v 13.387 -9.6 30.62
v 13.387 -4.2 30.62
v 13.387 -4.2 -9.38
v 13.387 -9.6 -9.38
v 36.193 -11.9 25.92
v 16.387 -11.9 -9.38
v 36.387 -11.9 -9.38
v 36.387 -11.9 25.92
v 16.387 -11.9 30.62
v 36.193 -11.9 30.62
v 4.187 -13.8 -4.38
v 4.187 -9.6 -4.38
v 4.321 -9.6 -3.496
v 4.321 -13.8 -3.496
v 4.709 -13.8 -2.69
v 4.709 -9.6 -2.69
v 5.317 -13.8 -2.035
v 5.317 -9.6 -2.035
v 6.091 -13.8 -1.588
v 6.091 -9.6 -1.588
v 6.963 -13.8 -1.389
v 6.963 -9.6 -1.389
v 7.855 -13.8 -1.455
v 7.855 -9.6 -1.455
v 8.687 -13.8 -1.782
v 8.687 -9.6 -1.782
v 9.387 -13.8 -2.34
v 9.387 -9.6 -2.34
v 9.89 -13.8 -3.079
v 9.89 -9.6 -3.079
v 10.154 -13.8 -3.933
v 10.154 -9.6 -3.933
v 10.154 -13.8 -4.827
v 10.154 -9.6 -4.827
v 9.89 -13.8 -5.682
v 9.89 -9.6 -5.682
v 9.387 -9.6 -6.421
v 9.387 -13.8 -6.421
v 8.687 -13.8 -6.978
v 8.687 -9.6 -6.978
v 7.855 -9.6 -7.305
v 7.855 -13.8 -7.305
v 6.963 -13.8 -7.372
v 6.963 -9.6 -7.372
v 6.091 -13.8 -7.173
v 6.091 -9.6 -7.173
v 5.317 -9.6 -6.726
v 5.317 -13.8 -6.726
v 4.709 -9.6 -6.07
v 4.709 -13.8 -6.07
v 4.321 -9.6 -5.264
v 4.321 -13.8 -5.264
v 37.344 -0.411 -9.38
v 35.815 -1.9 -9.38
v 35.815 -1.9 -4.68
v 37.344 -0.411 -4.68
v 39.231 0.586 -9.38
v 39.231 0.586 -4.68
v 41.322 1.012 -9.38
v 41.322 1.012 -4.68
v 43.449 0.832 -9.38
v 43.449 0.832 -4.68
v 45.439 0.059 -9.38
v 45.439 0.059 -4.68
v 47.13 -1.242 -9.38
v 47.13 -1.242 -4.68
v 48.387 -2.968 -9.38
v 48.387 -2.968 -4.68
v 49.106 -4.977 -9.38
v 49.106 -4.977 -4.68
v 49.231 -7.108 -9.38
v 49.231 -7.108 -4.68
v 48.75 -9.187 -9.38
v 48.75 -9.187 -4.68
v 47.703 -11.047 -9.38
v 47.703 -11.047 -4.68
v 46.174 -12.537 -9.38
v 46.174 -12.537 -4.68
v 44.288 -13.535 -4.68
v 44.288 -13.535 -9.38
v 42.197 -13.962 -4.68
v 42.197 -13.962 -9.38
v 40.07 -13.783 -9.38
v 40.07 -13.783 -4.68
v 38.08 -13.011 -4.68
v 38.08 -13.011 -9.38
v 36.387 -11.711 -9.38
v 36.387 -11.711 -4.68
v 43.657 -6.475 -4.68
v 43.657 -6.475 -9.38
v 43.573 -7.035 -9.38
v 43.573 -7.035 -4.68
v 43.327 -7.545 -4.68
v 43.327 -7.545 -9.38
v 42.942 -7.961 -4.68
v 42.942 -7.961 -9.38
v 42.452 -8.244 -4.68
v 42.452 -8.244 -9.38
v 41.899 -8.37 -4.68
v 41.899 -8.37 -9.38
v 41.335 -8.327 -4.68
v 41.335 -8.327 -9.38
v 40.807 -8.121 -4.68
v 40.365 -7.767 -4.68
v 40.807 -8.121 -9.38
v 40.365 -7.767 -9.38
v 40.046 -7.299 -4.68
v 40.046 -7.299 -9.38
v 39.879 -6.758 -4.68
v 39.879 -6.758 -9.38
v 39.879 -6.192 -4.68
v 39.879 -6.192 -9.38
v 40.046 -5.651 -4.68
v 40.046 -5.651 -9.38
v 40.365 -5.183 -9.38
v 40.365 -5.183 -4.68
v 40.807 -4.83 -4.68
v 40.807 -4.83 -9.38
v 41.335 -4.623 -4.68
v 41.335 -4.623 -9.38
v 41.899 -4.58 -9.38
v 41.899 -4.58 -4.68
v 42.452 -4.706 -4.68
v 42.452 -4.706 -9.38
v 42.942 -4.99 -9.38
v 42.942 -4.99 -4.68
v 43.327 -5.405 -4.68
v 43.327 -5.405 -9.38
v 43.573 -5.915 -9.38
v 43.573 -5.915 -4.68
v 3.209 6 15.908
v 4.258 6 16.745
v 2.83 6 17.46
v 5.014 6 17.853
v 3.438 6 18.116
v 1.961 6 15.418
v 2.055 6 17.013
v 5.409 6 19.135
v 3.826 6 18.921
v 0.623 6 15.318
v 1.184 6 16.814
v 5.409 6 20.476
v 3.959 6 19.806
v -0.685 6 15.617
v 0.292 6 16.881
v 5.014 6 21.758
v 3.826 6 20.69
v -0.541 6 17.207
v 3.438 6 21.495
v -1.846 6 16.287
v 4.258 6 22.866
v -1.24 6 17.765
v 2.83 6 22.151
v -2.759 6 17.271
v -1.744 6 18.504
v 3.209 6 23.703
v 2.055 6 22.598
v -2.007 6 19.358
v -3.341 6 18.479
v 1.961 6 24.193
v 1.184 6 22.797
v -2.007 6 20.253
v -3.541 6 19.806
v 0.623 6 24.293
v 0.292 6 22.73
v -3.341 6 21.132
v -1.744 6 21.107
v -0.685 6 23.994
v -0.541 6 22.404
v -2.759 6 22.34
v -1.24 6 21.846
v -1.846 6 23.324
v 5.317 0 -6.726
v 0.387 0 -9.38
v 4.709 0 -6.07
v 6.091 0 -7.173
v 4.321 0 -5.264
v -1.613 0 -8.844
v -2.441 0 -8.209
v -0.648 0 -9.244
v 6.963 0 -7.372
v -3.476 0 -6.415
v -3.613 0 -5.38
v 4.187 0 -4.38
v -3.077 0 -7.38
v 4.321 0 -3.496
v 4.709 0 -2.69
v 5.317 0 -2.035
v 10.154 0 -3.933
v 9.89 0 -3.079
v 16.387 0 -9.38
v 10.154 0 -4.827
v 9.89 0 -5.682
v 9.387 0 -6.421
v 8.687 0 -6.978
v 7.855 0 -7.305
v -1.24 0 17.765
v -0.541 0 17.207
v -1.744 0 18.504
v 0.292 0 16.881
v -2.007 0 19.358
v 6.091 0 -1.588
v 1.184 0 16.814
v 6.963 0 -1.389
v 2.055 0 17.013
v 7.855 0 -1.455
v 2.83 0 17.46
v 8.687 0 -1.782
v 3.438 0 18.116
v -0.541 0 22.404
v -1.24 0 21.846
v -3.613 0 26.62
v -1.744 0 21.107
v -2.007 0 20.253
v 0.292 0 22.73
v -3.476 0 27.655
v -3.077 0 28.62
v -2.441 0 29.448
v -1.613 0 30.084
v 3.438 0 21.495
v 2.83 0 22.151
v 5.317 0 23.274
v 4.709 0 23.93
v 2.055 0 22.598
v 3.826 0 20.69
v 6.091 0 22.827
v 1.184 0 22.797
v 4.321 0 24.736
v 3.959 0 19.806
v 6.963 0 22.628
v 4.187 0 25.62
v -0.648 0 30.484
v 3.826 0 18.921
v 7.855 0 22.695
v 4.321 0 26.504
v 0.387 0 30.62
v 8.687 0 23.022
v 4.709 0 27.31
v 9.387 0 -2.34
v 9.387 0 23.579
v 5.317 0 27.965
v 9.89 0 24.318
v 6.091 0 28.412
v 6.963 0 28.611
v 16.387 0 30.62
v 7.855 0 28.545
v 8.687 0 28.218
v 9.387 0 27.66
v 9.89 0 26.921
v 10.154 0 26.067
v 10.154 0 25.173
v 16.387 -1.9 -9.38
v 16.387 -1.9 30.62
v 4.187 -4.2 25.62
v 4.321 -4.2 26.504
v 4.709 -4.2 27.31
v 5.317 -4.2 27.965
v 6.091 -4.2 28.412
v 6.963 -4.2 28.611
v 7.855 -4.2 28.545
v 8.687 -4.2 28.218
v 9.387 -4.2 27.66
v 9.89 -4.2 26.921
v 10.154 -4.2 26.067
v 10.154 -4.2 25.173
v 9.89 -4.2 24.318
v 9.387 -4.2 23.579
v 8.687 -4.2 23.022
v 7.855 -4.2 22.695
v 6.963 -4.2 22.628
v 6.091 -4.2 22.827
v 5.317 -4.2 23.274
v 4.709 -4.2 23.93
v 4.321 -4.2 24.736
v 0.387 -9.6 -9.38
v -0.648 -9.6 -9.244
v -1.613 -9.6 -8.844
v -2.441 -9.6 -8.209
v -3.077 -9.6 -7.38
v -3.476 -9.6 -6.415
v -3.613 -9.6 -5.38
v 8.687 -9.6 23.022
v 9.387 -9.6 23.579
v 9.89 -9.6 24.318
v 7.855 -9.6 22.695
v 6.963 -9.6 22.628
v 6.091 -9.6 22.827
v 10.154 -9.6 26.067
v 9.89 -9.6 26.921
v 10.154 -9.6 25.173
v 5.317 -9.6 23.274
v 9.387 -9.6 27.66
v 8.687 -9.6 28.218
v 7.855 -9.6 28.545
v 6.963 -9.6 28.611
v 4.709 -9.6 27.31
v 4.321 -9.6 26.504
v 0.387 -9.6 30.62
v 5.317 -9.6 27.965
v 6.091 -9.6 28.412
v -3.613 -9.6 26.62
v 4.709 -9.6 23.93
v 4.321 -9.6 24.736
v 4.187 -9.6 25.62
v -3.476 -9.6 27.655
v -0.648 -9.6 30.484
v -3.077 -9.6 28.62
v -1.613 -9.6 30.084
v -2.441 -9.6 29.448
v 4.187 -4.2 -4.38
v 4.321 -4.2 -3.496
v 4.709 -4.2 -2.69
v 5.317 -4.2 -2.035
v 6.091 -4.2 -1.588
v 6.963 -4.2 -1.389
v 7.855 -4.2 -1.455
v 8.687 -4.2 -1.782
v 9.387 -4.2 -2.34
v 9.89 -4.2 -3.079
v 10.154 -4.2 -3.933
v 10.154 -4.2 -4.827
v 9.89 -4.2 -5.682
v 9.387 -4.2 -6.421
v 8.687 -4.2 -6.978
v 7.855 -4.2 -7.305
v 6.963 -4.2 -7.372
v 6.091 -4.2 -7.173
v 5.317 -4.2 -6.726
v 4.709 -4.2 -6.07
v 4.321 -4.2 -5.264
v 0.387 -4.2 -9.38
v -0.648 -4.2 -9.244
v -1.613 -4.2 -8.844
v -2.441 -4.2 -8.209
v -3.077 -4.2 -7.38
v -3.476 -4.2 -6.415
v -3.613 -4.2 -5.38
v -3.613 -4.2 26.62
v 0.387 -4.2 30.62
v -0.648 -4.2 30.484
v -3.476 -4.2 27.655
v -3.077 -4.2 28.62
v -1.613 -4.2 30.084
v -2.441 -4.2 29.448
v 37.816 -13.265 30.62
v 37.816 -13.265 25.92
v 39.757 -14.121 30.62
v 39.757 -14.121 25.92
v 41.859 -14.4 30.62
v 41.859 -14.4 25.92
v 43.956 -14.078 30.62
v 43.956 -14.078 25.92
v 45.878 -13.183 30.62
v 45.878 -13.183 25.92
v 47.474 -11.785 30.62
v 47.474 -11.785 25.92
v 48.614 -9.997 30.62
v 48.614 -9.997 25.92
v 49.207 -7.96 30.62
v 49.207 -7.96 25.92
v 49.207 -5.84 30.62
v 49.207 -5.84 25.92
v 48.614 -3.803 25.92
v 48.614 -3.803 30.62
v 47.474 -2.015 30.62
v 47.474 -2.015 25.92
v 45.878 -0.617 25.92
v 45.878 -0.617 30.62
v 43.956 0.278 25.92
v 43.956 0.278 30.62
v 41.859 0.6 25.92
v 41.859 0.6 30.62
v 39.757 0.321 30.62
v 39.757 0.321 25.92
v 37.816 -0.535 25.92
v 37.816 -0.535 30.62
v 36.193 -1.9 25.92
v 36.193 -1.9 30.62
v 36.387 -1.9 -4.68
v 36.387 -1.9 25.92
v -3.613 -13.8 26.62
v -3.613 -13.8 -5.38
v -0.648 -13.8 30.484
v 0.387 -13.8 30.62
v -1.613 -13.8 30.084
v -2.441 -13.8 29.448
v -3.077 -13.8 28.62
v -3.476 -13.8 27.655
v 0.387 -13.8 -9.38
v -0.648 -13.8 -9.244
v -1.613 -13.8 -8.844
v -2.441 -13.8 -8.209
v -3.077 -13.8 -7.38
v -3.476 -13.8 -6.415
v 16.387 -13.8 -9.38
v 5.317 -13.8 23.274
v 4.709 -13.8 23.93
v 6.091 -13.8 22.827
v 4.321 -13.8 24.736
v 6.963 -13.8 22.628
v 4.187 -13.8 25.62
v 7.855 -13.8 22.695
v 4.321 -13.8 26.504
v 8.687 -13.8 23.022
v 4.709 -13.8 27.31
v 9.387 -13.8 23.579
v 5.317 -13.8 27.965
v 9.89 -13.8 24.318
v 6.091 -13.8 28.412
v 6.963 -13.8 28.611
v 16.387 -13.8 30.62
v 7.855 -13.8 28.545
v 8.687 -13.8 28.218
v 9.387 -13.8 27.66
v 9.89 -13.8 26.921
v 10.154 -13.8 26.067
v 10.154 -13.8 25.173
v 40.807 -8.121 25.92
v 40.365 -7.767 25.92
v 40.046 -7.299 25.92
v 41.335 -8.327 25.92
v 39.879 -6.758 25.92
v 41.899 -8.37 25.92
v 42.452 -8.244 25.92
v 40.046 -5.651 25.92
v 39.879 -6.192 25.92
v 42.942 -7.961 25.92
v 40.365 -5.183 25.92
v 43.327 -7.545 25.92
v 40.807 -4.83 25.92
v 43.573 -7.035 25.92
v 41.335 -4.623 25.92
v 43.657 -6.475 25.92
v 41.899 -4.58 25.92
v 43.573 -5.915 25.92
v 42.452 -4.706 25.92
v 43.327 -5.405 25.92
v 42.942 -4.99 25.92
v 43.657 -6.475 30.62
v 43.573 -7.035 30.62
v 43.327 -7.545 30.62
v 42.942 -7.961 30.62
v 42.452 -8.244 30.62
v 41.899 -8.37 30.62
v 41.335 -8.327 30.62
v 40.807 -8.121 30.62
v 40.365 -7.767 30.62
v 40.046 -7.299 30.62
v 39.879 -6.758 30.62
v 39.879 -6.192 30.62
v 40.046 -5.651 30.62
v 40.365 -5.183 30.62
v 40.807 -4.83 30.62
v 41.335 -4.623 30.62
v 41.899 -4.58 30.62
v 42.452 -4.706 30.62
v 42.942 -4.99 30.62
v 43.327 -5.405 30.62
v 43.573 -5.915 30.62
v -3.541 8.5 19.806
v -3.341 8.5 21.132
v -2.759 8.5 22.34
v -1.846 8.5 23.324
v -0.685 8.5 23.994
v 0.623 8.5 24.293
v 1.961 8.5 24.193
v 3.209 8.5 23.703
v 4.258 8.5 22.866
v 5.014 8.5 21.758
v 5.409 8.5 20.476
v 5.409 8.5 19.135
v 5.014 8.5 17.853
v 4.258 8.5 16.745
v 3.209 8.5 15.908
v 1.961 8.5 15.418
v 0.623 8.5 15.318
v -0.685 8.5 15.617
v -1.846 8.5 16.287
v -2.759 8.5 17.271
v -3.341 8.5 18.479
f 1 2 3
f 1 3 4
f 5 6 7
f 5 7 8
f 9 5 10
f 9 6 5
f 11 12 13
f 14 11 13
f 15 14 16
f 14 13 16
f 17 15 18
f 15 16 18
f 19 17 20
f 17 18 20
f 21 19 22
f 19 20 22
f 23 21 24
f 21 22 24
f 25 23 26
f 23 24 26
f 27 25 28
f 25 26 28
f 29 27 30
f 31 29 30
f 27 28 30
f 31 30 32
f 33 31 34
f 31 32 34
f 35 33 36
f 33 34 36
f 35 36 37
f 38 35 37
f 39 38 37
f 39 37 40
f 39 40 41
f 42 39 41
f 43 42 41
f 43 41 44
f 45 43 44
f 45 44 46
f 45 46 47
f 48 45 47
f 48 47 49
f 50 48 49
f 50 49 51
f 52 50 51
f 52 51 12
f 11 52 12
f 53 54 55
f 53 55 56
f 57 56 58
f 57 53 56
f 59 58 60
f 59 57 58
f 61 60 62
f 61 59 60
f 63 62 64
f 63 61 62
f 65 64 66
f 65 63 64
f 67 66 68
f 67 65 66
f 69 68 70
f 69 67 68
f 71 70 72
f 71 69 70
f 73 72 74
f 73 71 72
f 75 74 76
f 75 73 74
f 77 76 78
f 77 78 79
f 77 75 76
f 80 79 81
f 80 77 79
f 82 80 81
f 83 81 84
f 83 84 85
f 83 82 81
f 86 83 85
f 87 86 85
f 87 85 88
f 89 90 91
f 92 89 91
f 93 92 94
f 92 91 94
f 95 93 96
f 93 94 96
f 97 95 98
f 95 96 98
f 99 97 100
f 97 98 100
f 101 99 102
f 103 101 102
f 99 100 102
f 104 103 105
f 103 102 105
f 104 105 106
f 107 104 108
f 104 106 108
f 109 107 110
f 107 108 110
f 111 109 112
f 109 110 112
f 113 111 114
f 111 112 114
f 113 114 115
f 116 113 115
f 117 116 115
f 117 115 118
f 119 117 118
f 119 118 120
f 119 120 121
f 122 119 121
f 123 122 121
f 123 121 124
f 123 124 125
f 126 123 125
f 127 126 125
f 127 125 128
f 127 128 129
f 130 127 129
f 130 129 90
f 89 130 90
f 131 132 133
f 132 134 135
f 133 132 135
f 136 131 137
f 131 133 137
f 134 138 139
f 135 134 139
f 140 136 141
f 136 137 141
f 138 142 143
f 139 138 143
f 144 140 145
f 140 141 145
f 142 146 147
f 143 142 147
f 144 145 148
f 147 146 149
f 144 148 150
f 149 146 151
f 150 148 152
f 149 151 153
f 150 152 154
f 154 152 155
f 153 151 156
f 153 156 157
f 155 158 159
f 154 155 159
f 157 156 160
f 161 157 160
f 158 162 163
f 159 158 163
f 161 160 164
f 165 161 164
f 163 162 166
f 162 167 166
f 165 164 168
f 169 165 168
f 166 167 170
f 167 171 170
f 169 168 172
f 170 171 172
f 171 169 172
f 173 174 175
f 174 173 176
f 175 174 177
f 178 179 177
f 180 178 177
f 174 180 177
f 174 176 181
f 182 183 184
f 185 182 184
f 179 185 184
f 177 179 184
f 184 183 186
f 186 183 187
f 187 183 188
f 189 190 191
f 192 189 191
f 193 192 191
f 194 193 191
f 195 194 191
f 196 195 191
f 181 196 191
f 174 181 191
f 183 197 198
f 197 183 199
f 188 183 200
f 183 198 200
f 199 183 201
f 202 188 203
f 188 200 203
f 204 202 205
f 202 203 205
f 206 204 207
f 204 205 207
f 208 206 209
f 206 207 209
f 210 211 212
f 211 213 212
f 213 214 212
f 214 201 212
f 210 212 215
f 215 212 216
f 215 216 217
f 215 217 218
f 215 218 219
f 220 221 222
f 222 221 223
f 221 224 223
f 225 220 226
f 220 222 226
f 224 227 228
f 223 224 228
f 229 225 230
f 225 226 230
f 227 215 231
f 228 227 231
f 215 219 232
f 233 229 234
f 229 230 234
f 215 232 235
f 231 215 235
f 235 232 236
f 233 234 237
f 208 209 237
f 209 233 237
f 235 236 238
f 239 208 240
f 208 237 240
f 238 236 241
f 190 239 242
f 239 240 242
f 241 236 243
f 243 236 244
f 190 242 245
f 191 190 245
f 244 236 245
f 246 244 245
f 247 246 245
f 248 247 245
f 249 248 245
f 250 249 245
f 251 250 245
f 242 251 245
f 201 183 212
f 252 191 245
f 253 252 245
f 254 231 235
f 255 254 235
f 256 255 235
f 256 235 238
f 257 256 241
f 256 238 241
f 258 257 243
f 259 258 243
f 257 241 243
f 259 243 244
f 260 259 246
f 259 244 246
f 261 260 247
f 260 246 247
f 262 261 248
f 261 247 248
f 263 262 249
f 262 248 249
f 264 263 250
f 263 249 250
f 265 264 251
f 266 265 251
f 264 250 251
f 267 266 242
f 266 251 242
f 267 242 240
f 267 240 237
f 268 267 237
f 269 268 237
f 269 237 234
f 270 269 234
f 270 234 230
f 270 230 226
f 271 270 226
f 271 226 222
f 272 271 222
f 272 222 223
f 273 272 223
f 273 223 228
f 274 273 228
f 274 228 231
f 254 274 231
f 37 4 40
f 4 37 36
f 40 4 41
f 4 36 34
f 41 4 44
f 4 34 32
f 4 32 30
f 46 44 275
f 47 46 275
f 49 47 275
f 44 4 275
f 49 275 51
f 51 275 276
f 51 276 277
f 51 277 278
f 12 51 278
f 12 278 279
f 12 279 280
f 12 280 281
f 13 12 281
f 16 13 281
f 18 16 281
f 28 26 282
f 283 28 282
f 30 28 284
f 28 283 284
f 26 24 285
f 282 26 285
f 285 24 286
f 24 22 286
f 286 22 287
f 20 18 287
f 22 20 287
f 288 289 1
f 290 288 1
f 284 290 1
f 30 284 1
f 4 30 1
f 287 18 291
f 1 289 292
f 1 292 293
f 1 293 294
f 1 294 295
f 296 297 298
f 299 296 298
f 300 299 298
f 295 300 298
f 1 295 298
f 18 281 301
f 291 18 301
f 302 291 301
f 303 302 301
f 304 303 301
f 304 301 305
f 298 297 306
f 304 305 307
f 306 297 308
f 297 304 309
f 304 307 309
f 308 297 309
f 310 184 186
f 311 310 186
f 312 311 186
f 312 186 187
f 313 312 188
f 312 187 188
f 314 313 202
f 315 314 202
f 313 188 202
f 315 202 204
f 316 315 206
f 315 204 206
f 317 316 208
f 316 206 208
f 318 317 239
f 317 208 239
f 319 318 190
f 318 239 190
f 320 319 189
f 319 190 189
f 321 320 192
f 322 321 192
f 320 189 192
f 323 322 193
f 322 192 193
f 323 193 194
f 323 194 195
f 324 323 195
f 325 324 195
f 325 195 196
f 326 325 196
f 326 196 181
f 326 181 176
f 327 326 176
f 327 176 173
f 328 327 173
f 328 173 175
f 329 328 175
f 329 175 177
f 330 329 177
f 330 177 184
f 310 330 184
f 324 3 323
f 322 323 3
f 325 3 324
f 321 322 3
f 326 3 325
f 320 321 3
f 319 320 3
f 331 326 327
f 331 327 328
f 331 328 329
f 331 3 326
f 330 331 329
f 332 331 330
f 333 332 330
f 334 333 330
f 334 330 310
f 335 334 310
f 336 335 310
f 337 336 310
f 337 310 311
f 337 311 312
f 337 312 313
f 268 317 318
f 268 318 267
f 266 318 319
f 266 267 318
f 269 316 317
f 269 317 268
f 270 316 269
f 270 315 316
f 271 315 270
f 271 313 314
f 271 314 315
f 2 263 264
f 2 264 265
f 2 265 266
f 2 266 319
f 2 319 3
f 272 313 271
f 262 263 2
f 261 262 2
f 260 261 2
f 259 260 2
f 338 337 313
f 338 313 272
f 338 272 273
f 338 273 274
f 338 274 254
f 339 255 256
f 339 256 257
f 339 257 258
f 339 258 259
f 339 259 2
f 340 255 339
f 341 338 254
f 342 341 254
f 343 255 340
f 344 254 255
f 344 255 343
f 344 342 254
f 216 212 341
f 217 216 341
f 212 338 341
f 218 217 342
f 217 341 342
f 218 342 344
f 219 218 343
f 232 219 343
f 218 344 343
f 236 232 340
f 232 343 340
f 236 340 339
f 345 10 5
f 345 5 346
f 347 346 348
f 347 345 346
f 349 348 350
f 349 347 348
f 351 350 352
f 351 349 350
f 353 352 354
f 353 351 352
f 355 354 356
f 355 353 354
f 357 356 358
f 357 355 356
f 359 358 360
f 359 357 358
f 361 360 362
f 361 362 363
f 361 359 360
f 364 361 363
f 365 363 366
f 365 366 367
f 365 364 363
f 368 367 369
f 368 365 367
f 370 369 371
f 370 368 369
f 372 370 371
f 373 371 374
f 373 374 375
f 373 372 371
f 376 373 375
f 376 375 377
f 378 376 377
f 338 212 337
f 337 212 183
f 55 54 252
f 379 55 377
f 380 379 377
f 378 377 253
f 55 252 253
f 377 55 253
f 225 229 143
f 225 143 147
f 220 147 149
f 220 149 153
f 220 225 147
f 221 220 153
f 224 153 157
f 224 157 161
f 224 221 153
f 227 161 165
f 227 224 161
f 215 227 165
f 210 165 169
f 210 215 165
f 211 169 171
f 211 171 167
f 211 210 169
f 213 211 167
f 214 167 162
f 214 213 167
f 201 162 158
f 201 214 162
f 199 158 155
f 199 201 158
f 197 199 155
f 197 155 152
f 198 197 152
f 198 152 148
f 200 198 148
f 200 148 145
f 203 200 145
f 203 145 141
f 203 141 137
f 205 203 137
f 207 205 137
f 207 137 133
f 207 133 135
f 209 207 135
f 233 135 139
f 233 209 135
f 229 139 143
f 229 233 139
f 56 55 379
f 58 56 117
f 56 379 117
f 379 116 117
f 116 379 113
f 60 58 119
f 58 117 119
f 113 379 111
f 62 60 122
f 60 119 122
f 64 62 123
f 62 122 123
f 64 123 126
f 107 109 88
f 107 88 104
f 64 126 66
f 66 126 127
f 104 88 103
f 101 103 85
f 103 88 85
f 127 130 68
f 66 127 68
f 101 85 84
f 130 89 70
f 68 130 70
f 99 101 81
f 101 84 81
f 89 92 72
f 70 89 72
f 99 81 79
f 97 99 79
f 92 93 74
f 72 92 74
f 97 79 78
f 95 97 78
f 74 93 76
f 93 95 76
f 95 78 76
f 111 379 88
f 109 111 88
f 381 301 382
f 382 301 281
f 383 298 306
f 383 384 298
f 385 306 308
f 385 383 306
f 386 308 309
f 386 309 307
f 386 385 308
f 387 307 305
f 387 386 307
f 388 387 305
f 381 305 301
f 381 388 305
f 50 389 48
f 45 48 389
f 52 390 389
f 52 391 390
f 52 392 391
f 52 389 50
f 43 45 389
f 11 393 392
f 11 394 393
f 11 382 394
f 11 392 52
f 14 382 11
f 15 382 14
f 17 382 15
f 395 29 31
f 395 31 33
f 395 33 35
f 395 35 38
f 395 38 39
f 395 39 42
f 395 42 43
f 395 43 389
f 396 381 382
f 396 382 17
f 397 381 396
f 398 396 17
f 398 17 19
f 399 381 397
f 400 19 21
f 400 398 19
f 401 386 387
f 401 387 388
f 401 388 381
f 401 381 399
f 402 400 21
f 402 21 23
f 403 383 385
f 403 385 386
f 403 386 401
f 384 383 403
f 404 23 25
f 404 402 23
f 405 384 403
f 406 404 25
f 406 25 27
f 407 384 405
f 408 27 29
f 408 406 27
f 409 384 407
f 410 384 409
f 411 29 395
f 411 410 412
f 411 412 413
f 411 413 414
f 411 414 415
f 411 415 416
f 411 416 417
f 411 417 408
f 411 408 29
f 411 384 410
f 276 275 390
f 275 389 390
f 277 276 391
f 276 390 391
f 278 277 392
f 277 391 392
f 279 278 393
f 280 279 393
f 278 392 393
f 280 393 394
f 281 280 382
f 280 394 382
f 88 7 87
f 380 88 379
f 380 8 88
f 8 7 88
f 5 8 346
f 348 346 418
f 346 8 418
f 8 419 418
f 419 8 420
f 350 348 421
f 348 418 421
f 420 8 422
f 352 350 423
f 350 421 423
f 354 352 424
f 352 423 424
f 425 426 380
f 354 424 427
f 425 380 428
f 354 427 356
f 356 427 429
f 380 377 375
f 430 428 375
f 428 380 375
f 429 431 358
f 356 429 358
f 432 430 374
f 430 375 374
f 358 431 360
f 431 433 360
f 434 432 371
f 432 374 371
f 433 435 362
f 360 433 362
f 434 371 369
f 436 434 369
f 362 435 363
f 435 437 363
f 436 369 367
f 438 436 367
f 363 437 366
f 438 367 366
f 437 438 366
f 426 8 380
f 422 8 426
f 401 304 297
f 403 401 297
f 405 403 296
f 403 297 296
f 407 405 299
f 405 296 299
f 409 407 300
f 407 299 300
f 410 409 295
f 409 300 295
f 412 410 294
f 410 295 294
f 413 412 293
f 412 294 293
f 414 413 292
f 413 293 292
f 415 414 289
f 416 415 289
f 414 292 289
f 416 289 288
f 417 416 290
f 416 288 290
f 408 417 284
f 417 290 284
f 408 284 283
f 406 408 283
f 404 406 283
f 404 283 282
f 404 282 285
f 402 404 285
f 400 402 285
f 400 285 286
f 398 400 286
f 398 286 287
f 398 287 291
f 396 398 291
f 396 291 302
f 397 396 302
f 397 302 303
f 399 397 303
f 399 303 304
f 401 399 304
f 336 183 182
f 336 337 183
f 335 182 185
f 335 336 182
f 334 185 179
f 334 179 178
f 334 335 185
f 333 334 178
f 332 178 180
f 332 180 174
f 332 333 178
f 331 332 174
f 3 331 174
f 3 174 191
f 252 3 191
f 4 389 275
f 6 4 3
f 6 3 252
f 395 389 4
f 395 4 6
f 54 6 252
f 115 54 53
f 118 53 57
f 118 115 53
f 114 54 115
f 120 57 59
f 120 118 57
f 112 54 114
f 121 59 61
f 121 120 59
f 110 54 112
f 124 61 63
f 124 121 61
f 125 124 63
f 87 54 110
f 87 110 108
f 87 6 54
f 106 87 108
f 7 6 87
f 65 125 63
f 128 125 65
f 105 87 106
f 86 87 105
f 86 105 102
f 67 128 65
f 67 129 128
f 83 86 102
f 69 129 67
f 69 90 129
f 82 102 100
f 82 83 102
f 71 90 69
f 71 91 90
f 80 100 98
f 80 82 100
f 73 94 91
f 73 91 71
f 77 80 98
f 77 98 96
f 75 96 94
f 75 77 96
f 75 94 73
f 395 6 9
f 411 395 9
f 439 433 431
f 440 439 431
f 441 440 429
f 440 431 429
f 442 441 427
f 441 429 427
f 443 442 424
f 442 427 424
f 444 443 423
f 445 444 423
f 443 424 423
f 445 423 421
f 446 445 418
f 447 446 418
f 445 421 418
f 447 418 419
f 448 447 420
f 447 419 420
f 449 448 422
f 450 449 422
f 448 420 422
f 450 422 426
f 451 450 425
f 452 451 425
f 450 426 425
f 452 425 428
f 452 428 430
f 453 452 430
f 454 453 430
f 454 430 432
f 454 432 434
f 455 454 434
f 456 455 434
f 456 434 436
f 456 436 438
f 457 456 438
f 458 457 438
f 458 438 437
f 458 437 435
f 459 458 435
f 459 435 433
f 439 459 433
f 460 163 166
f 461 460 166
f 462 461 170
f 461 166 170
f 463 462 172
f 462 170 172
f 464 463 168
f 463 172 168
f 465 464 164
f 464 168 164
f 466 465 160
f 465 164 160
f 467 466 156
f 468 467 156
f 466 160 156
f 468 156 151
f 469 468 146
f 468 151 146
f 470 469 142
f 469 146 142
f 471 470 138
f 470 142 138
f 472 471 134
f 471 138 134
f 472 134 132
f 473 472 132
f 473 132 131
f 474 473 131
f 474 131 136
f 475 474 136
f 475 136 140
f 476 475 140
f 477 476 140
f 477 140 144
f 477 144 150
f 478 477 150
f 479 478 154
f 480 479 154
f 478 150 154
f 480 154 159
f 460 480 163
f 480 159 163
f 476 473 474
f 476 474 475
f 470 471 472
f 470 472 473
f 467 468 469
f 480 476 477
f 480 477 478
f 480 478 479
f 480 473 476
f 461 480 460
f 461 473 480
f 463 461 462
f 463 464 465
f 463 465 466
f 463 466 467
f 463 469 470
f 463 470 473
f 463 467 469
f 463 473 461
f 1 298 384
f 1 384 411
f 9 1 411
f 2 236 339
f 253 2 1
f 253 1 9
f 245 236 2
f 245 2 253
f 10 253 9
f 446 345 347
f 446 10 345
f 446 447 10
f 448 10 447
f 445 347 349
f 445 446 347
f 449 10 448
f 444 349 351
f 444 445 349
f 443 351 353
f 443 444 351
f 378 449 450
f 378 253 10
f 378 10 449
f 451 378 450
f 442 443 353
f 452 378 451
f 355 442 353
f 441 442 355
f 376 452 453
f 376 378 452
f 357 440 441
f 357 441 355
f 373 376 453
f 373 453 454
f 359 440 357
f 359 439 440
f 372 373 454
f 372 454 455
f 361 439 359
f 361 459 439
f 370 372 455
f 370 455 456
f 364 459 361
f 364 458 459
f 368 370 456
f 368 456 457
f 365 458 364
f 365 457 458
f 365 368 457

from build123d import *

# Parameters (mm, degrees)
F1_DEPTH  = 13.8
F2_W      = 5.4
F2_H      = 40
F3_DEPTH  = 17
F4_R      = 3
F5_DEPTH  = 25
F6_R      = 3
F7_DEPTH  = 6
F8_R      = 4.5
F9_DEPTH  = 2.5
F10_R     = 4
F11_W     = 10
F11_H     = 40
F12_DEPTH = 20
F13_R     = 7.5
F14_DEPTH = 4.7
F15_R     = 7.5
F16_DEPTH = 4.7
F17_R     = 1.9
F18_DEPTH = 70


with BuildPart() as f1:
    # F0 (on Front) → F1 (new body)
    with BuildSketch(Plane.XZ):
        Polygon((11.3874197267, 30.6198454252), (-3.6125802733, 30.6198454252), (-3.6125802733, -9.3801545748), (11.3874197267, -9.3801545748), (16.3874197267, -9.3801545748), (16.3874197267, 5.6198454252), (16.3874197267, 25.6198454252), (16.3874197267, 30.6198454252), align=None)
    extrude(amount=F1_DEPTH)

    # F2 (on face) → F3 (cut)
    with BuildSketch(Plane(origin=(-3.6125802733, 0, 0), x_dir=(0, -1, 0), z_dir=(-1, 0, 0))):
        with Locations((6.9, 10.6198454252)):
            Rectangle(F2_W, F2_H)
    extrude(amount=-F3_DEPTH, mode=Mode.SUBTRACT)

    # F4 (on face) → F5 (cut)
    with BuildSketch(Plane(origin=(0, 0, 0), x_dir=(-1, 0, 0), z_dir=(0, 1, 0))):
        with Locations((-7.1874197267, 25.6198454252)):
            Circle(F4_R)
        with Locations((-7.1874197267, -4.3801545748)):
            Circle(F4_R)
    extrude(amount=-F5_DEPTH, mode=Mode.SUBTRACT)

    # F6 (on face) → F7 (join)
    with BuildSketch(Plane.XZ):
        with Locations((0.9593699942, 19.8055244982)):
            Circle(F6_R)
    extrude(amount=-F7_DEPTH)

    # F8 (on face) → F9 (join)
    with BuildSketch(Plane(origin=(0, 6, 0), x_dir=(-1, 0, 0), z_dir=(0, 1, 0))):
        with Locations((-0.9593699942, 19.8055244982)):
            Circle(F8_R)
    extrude(amount=F9_DEPTH)

    # F10
    f10_edges = [f1.edges().sort_by_distance(p)[0] for p in [
        (-3.61258, -2.1, 30.619845),
        (-3.61258, -11.7, 30.619845),
        (-3.61258, -2.1, -9.380155),
        (-3.61258, -11.7, -9.380155),
    ]]
    fillet(f10_edges, radius=F10_R)

    # F11 (on face) → F12 (join)
    with BuildSketch(Plane.YZ.offset(16.3874197267)):
        with Locations((-6.9, 10.6198454252)):
            Rectangle(F11_W, F11_H)
    extrude(amount=F12_DEPTH)

    # F13 (on face) → F14 (join)
    with BuildSketch(Plane.XY.offset(30.6198454252)):
        with Locations((41.7828261852, -6.9)):
            Circle(F13_R)
    extrude(amount=-F14_DEPTH)

    # F15 (on face) → F16 (join)
    with BuildSketch(Plane(origin=(0, 0, -9.3801545748), x_dir=(1, 0, 0), z_dir=(0, 0, -1))):
        with Locations((41.7574755847, 6.4750881866)):
            Circle(F15_R)
    extrude(amount=-F16_DEPTH)

    # F17 (on face) → F18 (cut)
    with BuildSketch(Plane(origin=(0, 0, -9.3801545748), x_dir=(1, 0, 0), z_dir=(0, 0, -1))):
        with Locations((41.7574755847, 6.4750881866)):
            Circle(F17_R)
    extrude(amount=-F18_DEPTH, mode=Mode.SUBTRACT)


solid = f1.part
